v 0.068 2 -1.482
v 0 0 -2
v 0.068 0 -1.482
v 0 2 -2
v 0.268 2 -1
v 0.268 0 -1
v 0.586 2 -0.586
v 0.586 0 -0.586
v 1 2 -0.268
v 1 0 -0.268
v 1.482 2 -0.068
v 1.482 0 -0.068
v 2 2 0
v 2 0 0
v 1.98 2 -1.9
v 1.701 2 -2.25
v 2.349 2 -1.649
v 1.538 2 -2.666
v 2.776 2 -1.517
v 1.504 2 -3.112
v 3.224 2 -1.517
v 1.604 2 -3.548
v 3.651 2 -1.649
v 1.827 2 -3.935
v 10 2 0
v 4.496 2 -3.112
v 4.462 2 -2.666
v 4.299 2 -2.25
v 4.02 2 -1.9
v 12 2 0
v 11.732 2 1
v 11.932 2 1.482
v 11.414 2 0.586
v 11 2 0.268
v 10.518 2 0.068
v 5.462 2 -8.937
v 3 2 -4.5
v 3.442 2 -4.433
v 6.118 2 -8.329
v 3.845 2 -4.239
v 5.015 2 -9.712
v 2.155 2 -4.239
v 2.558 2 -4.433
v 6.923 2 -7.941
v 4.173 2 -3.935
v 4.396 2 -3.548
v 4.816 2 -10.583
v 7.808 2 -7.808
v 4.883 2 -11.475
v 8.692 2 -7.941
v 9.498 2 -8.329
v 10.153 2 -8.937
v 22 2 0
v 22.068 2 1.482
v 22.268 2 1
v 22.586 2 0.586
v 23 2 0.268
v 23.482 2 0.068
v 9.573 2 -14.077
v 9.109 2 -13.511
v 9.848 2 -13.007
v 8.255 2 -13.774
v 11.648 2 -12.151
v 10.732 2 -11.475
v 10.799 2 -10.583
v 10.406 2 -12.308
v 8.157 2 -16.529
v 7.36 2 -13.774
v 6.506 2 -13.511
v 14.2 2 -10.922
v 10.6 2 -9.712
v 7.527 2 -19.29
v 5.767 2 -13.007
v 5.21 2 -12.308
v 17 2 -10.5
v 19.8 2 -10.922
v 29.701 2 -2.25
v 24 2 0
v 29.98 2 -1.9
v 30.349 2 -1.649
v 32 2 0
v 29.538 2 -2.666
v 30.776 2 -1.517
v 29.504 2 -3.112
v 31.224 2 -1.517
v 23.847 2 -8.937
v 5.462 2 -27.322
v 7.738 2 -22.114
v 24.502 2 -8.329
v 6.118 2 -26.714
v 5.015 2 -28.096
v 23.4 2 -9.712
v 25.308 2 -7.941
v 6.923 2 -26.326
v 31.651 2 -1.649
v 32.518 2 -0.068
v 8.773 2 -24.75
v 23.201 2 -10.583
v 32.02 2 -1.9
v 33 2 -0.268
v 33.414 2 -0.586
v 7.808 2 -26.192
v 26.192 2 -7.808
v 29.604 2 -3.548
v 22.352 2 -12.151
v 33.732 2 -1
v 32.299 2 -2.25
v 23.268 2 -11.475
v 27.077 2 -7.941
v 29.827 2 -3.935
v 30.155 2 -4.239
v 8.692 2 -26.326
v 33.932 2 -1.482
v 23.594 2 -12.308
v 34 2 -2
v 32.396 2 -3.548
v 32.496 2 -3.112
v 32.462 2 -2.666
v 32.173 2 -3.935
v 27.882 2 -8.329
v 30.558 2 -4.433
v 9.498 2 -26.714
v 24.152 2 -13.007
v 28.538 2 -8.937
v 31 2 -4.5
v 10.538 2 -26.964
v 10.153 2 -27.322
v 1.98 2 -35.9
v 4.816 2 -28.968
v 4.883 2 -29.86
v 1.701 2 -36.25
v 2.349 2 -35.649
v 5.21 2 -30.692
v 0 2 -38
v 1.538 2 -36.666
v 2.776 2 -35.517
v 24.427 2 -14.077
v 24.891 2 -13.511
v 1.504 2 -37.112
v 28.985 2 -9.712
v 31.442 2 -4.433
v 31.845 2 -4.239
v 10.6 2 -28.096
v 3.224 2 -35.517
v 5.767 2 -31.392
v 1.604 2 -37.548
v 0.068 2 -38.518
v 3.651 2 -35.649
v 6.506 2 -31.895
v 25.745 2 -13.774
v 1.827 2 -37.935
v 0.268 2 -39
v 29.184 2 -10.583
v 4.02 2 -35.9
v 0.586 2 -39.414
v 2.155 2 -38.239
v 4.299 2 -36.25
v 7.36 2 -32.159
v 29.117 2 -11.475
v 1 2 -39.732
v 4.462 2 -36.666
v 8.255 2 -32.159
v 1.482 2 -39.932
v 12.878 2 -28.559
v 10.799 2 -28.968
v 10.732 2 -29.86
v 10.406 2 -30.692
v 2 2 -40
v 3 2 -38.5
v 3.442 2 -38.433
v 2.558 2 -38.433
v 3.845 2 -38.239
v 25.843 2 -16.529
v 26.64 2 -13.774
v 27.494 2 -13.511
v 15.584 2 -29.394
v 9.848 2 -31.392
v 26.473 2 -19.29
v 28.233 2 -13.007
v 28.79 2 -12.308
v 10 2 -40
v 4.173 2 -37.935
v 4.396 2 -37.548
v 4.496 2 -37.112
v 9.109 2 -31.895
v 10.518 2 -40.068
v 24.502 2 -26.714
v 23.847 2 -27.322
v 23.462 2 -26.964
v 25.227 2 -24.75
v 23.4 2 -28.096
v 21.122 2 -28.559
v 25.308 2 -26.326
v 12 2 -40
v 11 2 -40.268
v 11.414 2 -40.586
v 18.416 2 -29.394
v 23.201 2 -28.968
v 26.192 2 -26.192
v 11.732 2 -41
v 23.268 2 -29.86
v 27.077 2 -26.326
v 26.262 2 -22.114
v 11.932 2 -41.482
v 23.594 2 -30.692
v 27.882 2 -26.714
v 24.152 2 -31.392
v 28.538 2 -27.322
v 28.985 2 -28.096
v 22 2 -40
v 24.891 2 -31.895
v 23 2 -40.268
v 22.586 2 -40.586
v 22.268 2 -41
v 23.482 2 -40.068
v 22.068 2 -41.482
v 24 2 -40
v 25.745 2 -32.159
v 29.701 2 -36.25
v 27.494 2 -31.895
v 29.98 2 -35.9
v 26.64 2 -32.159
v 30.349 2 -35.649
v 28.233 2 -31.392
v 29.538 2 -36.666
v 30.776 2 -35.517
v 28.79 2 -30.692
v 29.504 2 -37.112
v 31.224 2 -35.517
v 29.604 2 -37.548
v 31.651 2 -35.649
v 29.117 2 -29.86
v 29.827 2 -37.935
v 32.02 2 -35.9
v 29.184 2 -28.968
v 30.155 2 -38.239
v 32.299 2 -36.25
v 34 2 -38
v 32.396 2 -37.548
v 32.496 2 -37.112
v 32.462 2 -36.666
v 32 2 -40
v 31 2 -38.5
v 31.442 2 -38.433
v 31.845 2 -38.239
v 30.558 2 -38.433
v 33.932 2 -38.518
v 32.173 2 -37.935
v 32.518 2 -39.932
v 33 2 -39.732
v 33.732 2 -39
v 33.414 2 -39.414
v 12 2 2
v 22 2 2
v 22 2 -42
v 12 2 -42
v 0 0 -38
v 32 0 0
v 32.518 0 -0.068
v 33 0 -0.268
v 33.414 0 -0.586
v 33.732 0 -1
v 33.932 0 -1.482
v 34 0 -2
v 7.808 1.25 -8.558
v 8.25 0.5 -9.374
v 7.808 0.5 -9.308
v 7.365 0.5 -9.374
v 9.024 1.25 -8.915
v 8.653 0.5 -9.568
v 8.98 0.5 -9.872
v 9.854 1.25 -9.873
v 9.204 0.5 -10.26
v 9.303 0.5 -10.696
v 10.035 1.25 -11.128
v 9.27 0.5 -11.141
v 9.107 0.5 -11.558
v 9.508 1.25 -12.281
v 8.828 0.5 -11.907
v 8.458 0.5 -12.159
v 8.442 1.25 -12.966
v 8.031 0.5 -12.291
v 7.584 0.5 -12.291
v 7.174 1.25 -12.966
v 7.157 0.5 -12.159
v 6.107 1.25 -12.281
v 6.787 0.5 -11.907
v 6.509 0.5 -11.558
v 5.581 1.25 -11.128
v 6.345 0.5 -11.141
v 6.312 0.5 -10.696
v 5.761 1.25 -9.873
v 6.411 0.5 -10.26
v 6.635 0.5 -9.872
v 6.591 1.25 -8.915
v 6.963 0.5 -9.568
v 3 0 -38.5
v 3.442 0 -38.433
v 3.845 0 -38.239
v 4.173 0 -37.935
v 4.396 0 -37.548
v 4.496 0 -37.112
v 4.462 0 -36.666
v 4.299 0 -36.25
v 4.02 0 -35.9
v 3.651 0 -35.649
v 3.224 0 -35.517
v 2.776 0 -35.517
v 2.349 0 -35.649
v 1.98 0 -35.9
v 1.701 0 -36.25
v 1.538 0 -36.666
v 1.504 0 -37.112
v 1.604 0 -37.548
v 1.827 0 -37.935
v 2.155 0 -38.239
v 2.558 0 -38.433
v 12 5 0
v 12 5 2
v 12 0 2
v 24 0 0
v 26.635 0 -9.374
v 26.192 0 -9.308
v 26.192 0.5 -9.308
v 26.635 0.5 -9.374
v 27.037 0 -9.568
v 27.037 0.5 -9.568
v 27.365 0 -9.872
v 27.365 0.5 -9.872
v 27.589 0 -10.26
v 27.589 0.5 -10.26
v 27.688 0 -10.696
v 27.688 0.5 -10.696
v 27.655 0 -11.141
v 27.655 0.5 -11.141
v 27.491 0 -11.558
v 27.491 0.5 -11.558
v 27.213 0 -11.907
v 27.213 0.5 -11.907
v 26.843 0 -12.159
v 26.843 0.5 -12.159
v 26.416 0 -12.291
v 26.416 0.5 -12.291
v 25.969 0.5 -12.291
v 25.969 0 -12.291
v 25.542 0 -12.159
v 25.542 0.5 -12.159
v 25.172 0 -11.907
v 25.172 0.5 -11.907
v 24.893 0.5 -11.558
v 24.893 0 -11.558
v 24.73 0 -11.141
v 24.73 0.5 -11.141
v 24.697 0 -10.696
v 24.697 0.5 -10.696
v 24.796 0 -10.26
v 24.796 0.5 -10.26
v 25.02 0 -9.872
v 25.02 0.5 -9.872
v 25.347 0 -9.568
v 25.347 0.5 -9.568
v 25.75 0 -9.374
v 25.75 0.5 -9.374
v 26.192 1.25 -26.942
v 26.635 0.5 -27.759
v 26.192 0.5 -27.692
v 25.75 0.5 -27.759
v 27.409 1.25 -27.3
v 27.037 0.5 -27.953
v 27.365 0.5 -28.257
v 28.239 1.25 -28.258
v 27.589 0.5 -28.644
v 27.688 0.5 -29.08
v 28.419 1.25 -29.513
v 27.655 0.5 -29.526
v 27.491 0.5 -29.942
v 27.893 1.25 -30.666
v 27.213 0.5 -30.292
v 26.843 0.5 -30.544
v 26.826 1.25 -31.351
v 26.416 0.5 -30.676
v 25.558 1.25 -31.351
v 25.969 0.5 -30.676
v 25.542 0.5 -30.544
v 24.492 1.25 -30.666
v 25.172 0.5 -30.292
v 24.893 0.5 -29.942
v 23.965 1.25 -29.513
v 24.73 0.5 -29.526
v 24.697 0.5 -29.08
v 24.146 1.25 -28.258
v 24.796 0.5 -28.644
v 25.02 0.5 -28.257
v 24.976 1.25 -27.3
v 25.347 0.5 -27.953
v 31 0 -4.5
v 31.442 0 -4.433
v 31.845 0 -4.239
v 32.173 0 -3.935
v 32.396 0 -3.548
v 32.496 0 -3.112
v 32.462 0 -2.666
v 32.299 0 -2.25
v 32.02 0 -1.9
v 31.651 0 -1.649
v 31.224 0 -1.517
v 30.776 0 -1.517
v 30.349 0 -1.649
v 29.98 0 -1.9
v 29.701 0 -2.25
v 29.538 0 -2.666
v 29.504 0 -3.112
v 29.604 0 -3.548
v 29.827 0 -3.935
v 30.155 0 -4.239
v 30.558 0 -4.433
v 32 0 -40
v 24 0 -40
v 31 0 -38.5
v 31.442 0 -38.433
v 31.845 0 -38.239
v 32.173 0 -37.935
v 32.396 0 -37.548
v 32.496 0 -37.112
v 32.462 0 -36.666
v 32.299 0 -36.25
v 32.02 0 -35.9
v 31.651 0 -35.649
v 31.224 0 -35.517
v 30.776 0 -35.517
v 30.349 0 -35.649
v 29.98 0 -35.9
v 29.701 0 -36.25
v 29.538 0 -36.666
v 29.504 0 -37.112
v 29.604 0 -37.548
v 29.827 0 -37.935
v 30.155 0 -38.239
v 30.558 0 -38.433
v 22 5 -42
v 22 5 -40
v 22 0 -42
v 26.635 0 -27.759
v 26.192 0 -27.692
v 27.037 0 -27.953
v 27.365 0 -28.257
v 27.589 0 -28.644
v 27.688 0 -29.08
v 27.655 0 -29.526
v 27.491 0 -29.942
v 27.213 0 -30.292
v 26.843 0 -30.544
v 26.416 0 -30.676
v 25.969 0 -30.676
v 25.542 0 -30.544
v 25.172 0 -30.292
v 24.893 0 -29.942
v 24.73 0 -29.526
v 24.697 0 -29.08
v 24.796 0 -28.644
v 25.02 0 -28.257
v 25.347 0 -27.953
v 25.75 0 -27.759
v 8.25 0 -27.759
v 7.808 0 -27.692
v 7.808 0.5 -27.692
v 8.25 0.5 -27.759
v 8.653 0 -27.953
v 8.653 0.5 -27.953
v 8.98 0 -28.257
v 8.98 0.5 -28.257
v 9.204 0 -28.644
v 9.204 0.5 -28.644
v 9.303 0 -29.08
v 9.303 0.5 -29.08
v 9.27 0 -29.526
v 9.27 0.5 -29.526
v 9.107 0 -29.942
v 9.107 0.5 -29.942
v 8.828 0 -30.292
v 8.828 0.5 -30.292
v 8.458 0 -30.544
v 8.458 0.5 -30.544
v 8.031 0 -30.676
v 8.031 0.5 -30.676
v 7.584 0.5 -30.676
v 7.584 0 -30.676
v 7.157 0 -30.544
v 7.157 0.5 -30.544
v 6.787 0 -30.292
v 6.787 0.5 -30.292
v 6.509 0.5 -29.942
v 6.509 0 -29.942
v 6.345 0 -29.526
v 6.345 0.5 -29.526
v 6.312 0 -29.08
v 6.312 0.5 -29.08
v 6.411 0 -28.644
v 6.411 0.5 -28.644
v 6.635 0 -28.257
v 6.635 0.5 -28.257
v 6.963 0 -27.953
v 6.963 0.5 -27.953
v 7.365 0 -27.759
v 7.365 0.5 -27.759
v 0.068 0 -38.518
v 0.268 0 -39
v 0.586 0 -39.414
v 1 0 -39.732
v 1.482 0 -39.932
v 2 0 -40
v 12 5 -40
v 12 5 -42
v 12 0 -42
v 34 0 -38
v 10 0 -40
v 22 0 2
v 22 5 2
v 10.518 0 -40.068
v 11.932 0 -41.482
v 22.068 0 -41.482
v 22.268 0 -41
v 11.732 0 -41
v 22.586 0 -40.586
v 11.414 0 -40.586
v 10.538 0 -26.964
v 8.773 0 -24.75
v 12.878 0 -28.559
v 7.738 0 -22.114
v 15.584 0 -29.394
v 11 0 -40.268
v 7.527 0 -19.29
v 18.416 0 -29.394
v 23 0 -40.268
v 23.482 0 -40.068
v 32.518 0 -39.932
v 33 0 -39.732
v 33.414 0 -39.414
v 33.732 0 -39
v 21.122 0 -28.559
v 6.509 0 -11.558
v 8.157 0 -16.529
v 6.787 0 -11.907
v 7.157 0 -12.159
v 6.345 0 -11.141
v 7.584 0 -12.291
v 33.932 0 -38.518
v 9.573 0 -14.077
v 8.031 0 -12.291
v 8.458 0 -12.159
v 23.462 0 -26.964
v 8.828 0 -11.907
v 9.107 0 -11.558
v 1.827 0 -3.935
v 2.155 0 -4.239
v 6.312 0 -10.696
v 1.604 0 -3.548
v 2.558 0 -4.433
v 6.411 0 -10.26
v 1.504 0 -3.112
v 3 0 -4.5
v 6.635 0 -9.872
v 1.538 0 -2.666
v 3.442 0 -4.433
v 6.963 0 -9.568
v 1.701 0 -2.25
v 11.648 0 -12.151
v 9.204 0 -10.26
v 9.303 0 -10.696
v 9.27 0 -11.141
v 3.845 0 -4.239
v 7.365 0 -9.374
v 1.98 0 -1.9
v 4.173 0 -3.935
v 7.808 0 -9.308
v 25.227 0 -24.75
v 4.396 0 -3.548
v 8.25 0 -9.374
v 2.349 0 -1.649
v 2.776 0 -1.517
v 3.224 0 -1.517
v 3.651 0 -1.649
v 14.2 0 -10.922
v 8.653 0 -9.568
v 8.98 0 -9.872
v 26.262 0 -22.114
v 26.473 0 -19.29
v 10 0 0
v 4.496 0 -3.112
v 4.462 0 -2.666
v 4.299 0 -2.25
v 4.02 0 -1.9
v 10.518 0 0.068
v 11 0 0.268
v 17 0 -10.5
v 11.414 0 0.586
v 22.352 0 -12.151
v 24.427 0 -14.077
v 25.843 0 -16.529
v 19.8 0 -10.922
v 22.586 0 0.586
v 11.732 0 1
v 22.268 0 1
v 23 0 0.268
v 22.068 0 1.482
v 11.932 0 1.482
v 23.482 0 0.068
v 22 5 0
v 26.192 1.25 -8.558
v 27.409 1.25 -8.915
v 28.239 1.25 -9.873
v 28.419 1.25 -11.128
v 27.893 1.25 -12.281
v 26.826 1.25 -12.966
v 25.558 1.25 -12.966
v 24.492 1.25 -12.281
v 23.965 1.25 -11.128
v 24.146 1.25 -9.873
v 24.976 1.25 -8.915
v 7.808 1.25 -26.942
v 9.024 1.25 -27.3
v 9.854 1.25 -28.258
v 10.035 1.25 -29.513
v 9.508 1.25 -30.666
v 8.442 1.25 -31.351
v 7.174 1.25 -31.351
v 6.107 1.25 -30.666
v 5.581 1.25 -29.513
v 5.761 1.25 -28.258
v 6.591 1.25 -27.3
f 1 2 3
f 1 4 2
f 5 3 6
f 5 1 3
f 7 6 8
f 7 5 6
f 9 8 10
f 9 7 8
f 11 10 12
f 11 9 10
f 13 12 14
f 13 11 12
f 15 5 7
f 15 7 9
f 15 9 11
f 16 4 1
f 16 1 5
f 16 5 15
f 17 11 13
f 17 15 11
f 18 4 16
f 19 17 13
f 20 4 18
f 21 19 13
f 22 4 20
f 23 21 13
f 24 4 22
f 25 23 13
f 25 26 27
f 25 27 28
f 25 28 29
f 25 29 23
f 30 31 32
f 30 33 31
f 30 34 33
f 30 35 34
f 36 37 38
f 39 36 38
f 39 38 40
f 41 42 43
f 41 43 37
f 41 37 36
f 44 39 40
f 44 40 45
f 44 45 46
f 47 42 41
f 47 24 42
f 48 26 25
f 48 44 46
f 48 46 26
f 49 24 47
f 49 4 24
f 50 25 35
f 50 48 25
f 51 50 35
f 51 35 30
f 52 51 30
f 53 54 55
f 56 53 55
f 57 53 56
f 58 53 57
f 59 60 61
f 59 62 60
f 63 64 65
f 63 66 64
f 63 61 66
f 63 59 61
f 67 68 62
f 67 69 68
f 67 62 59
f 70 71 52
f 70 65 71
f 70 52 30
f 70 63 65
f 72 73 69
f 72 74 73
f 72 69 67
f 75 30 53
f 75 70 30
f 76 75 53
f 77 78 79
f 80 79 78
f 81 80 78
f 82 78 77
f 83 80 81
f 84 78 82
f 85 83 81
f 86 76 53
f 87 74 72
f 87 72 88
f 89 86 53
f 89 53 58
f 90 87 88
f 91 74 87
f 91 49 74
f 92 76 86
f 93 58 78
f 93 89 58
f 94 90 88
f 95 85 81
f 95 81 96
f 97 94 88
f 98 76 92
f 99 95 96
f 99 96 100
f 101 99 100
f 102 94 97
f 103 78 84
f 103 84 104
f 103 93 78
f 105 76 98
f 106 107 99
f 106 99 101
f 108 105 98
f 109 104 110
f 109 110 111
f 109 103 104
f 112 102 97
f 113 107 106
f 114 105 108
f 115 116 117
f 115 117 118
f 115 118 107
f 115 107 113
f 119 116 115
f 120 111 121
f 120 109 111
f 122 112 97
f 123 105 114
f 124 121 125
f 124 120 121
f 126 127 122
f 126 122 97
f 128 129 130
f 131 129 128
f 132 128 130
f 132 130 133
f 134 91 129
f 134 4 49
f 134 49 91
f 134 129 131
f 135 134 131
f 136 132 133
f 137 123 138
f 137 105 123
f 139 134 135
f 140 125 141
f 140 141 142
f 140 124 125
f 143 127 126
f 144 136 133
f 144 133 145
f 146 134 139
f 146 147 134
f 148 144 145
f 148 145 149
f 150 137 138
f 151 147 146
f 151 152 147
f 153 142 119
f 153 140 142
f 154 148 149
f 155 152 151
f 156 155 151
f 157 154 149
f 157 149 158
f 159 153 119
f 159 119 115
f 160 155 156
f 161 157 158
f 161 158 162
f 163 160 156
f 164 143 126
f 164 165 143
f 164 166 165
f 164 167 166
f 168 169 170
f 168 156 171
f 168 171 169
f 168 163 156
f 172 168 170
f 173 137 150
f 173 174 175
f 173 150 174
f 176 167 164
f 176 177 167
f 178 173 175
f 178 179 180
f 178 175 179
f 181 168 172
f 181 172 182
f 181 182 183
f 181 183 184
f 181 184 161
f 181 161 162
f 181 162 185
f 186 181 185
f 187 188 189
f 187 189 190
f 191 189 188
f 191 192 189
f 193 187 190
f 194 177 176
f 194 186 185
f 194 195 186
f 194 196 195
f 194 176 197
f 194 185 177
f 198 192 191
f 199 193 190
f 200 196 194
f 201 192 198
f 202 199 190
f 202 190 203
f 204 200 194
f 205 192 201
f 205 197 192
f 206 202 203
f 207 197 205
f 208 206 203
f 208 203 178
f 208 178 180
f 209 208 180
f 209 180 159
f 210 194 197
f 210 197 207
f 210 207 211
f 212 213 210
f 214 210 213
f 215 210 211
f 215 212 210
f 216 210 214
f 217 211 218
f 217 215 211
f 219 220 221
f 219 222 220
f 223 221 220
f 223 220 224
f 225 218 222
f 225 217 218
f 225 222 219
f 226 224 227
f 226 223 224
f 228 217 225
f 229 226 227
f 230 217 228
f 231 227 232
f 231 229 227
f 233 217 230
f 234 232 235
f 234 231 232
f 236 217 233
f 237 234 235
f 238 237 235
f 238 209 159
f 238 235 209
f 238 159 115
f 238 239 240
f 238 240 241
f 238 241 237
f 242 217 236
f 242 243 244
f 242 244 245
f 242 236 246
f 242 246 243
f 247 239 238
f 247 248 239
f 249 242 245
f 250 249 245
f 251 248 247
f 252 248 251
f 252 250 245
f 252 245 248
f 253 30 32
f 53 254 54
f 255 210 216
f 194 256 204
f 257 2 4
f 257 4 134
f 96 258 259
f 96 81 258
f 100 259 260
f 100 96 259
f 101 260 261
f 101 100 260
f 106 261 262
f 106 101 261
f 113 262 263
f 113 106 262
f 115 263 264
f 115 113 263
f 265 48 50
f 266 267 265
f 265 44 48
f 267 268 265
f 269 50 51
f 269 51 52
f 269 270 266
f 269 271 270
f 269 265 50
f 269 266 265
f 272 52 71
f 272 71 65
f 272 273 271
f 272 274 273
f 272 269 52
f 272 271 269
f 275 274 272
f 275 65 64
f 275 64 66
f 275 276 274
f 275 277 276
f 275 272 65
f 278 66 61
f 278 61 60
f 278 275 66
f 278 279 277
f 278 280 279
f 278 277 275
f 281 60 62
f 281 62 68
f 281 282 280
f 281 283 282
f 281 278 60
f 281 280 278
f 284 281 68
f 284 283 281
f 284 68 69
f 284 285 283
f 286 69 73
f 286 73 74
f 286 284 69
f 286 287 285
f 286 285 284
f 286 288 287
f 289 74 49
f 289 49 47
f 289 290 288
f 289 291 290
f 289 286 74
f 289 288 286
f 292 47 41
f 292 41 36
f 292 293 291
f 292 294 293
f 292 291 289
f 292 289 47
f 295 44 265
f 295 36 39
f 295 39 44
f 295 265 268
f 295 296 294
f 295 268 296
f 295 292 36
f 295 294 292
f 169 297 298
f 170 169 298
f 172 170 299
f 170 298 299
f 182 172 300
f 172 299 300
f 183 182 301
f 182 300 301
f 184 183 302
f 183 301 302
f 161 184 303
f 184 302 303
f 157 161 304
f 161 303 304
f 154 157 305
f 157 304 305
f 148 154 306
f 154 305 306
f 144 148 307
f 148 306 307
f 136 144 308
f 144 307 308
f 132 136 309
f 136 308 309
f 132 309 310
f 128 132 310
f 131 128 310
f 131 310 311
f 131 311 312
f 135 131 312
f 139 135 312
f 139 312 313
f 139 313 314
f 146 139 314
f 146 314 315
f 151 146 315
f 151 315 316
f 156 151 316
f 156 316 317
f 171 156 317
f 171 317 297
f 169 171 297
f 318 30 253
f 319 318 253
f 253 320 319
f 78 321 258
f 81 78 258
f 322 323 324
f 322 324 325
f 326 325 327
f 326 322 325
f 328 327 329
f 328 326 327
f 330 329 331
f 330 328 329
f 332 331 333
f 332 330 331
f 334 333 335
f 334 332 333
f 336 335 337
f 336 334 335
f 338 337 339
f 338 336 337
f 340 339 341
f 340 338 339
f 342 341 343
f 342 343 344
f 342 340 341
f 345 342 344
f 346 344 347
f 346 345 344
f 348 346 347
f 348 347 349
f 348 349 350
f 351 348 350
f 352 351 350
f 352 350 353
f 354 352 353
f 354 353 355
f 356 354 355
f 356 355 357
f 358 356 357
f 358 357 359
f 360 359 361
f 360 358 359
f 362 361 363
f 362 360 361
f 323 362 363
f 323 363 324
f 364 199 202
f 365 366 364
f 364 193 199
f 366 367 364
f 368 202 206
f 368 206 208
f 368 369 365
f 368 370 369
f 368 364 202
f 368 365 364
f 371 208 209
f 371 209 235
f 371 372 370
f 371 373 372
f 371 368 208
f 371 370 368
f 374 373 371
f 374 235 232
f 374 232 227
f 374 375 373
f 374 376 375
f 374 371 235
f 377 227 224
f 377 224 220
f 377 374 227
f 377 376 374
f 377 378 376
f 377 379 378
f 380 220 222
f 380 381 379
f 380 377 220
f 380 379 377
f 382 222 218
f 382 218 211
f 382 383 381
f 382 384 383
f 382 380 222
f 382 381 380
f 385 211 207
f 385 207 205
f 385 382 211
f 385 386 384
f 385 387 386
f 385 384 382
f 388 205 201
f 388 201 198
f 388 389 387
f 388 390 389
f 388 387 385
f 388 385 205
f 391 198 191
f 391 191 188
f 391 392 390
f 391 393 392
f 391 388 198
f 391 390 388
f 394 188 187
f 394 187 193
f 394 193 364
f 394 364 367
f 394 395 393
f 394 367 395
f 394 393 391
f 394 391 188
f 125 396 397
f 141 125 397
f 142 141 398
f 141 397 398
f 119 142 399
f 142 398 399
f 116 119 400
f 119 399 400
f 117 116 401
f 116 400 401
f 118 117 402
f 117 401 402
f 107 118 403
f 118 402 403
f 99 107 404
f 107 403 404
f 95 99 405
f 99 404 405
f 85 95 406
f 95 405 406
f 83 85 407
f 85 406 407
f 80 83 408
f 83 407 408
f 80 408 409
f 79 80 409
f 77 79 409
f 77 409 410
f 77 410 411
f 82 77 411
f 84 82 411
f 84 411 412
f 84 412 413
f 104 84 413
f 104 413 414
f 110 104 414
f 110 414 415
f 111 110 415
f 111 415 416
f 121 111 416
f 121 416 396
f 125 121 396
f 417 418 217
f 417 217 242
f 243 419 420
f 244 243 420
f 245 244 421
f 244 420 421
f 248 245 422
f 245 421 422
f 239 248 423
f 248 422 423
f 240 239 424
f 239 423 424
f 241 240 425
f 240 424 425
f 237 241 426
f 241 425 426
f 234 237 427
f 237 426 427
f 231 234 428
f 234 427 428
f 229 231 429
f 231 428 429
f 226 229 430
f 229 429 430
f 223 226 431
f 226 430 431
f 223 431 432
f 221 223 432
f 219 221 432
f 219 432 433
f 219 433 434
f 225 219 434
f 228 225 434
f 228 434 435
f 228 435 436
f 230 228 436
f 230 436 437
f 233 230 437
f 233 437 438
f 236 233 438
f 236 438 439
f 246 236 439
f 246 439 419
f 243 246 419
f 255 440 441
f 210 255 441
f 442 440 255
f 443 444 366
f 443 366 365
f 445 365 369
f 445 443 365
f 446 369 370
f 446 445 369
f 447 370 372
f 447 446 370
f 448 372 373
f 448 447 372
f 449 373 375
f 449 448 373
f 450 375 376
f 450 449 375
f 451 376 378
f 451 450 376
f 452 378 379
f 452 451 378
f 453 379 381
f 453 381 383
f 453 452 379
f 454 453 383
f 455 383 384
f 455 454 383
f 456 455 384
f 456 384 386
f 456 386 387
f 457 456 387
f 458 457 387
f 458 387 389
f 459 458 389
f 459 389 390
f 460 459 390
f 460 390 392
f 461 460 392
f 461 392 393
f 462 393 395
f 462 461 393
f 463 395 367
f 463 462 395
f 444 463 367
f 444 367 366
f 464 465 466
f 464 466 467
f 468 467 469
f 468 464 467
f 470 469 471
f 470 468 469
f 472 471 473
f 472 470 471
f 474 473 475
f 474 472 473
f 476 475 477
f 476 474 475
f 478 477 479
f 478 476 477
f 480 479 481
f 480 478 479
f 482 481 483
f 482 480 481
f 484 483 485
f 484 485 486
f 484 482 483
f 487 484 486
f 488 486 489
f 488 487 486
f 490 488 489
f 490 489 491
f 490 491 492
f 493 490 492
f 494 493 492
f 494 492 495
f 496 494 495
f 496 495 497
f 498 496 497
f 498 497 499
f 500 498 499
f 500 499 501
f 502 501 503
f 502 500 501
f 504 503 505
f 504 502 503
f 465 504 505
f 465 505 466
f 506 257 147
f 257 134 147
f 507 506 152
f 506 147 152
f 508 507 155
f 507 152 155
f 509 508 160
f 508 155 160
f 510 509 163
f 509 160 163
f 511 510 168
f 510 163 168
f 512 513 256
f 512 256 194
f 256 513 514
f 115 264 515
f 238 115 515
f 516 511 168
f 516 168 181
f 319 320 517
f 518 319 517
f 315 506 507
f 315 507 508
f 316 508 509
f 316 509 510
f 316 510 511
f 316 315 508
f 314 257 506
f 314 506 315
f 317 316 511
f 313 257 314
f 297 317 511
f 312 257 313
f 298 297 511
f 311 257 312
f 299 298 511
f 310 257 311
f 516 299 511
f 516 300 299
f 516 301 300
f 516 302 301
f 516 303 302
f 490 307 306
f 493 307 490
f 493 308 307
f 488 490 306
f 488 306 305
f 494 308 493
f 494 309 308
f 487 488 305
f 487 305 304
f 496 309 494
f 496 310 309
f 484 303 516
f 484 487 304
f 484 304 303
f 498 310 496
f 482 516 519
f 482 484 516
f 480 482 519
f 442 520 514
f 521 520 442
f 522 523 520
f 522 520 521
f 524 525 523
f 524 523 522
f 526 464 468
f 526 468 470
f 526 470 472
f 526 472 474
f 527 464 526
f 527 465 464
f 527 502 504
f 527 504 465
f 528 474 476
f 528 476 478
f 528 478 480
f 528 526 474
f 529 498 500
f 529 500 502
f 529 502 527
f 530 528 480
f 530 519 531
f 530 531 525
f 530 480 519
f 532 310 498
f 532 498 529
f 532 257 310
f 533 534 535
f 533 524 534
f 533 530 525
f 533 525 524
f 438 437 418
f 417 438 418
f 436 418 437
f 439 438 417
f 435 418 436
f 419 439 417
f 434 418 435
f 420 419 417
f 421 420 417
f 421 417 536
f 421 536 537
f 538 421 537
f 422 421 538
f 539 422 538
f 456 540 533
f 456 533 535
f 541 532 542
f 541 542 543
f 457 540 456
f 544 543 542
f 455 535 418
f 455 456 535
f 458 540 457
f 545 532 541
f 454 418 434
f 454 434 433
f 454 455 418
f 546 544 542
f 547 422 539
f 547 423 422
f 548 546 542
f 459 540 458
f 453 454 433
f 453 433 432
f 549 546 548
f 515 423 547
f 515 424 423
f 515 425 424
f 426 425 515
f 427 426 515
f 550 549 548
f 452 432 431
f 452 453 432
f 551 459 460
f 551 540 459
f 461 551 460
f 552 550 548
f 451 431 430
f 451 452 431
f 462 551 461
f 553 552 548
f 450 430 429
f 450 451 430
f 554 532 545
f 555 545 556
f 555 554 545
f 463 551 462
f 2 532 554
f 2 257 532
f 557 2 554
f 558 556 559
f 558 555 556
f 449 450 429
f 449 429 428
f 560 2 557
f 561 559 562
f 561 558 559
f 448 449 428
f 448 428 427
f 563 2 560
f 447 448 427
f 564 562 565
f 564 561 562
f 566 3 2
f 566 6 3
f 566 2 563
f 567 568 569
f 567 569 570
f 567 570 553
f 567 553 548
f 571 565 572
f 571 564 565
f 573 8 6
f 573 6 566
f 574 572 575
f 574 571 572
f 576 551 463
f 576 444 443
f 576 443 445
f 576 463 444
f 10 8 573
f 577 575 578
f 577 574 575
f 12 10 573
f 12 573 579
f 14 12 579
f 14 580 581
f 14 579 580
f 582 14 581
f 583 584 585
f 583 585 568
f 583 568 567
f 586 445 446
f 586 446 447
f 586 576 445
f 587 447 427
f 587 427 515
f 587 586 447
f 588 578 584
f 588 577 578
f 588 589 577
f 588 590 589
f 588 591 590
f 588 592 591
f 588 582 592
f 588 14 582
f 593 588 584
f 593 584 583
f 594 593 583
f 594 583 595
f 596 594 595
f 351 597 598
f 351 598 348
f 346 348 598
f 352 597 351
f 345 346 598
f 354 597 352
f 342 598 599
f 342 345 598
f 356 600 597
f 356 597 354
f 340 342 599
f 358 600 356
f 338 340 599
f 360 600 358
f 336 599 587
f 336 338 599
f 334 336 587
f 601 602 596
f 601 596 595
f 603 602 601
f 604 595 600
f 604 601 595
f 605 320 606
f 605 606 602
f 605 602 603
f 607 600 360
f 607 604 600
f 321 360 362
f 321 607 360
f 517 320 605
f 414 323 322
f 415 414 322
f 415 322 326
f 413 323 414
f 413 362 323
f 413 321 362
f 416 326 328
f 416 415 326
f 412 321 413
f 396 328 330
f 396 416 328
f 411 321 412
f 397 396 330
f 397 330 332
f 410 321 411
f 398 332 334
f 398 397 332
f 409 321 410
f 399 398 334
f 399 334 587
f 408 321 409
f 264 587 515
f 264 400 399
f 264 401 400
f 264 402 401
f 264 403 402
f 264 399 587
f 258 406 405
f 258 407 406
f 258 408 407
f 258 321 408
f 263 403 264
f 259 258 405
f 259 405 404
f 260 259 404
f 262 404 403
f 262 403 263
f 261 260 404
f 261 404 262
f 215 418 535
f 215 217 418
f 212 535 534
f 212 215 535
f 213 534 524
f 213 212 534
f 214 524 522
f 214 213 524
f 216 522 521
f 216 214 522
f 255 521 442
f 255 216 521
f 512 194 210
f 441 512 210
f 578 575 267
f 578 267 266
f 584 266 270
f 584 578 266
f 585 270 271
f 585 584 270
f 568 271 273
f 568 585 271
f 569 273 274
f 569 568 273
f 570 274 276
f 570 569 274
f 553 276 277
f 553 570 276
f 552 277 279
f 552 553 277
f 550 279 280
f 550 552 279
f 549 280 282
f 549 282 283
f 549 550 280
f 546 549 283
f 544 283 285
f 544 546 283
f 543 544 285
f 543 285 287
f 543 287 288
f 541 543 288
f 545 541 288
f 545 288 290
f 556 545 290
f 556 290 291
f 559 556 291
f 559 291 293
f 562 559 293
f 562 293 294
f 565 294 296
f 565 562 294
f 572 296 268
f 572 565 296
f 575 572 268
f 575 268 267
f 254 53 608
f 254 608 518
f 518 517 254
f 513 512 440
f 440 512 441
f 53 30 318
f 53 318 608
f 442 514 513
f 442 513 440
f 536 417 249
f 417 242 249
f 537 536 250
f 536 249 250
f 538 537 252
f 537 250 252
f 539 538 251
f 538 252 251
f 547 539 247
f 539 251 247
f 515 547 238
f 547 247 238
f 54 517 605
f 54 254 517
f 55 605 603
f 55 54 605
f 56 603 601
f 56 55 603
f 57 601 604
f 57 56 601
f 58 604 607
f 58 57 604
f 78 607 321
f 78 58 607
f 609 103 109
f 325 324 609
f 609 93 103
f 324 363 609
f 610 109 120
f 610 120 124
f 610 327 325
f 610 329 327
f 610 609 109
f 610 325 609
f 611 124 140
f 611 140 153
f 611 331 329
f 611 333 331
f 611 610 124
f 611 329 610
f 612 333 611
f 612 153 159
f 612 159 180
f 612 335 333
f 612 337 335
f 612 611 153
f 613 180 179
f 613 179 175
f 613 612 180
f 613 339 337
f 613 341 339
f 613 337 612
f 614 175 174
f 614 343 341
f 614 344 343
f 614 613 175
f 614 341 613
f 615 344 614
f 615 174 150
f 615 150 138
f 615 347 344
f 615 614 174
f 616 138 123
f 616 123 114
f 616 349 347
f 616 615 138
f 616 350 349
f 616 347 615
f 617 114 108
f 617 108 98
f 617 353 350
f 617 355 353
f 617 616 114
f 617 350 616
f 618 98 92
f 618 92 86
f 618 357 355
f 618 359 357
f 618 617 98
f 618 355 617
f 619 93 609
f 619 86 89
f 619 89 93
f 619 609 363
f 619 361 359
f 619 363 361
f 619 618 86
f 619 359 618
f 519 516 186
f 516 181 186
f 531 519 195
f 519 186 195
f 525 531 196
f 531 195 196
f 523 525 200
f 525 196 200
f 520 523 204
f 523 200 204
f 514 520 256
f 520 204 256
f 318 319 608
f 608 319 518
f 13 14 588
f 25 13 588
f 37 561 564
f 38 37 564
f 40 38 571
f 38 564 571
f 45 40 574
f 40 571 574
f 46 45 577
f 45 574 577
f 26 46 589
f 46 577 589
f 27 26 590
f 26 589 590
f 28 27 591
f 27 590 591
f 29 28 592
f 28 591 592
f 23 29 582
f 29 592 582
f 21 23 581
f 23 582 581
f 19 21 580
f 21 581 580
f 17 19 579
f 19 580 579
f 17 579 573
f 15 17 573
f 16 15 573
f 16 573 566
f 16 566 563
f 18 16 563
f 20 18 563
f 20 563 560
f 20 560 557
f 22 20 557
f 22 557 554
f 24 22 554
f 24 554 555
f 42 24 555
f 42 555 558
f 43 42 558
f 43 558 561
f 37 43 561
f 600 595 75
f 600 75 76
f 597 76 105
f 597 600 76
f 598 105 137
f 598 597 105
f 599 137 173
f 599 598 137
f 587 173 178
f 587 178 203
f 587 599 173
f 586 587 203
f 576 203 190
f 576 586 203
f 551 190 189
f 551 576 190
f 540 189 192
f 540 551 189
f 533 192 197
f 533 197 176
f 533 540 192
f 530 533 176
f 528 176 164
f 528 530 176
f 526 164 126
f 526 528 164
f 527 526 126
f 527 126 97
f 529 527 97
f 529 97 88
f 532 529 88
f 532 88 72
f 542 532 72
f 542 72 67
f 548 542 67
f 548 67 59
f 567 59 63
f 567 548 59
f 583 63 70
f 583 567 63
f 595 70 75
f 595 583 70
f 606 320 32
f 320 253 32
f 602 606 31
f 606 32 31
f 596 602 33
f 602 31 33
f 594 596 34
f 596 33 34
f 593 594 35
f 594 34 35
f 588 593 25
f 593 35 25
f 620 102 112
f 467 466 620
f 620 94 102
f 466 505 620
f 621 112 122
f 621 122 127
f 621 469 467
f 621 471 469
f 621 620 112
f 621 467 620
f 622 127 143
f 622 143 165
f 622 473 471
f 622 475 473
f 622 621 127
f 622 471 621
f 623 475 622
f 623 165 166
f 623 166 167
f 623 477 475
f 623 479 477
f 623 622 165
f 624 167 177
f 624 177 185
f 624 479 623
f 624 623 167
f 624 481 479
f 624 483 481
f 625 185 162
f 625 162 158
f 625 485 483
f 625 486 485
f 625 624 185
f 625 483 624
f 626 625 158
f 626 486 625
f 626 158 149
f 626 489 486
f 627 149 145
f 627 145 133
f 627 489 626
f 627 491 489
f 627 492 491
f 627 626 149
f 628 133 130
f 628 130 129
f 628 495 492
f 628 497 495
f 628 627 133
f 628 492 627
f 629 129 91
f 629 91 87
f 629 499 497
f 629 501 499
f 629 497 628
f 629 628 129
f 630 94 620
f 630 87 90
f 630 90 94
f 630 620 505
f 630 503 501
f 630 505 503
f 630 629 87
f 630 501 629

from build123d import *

# Parameters (mm, degrees)
SKETCH_1_W            = 34
SKETCH_1_H            = 40
SKETCH_1_R            = 9.5
SKETCH_1_R_2          = 1.5
EXTRUDE_1_DEPTH       = 2
HOLE_WIZARD_3_0_3_1_D = 3
FILLET_1_R            = 2
SKETCH_5_W            = 10
SKETCH_5_H            = 2
EXTRUDE_2_DEPTH       = 5
FILLET_2_R            = 2
CHAMFER_1_SIZE        = 1.5


with BuildPart() as part:
    # 草图1 → 凸台-拉伸1 (new body)
    with BuildSketch(Plane(origin=(0, 0, 0), x_dir=(1, 0, 0), z_dir=(0, 1, 0))):
        with Locations((17, 20)):
            Rectangle(SKETCH_1_W, SKETCH_1_H)
        with Locations(Location((17, 20, 0), (0, 0, 270))):
            Circle(SKETCH_1_R, mode=Mode.SUBTRACT)
        with Locations(Location((26.192388155, 29.192388155, 0), (0, 0, 270))):
            Circle(SKETCH_1_R_2, mode=Mode.SUBTRACT)
        with Locations(Location((7.807611845, 29.192388155, 0), (0, 0, 270))):
            Circle(SKETCH_1_R_2, mode=Mode.SUBTRACT)
        with Locations(Location((7.807611845, 10.807611845, 0), (0, 0, 270))):
            Circle(SKETCH_1_R_2, mode=Mode.SUBTRACT)
        with Locations(Location((26.192388155, 10.807611845, 0), (0, 0, 270))):
            Circle(SKETCH_1_R_2, mode=Mode.SUBTRACT)
    extrude(amount=EXTRUDE_1_DEPTH)

    # Ø3.0 (3) 直径孔1 (through all)
    with Locations(Plane(origin=(3, 2, -37), x_dir=(0, 0, 1), z_dir=(0, 1, 0))):
        with Locations((0, 0), (0, 28), (34, 28), (34, 0)):
            Hole(HOLE_WIZARD_3_0_3_1_D / 2)

    # 圆角1
    fillet_1_edges = [part.edges().sort_by_distance(p)[0] for p in [
        (0, 1, -40),
        (34, 1, -40),
        (34, 1, 0),
        (0, 1, 0),
    ]]
    fillet(fillet_1_edges, radius=FILLET_1_R)

    # 草图5 → 凸台-拉伸2 (add)
    with BuildSketch(Plane.XZ):
        with Locations((17, 1)):
            Rectangle(SKETCH_5_W, SKETCH_5_H)
        with Locations((17, -41)):
            Rectangle(SKETCH_5_W, SKETCH_5_H)
    extrude(amount=-EXTRUDE_2_DEPTH)

    # 圆角2
    fillet_2_edges = [part.edges().sort_by_distance(p)[0] for p in [
        (22, 1, -40),
        (12, 1, -40),
        (12, 1, 0),
        (22, 1, 0),
    ]]
    fillet(fillet_2_edges, radius=FILLET_2_R - 0.0001)  # a hair under: the kernel refuses the full size

    # 倒角1
    chamfer_1_edges = [part.edges().sort_by_distance(p)[0] for p in [
        (26.192388155, 2, -30.692388155),
        (7.807611845, 2, -30.692388155),
        (7.807611845, 2, -12.307611845),
        (26.192388155, 2, -12.307611845),
    ]]
    chamfer(chamfer_1_edges, length=CHAMFER_1_SIZE)


solid = part.part
